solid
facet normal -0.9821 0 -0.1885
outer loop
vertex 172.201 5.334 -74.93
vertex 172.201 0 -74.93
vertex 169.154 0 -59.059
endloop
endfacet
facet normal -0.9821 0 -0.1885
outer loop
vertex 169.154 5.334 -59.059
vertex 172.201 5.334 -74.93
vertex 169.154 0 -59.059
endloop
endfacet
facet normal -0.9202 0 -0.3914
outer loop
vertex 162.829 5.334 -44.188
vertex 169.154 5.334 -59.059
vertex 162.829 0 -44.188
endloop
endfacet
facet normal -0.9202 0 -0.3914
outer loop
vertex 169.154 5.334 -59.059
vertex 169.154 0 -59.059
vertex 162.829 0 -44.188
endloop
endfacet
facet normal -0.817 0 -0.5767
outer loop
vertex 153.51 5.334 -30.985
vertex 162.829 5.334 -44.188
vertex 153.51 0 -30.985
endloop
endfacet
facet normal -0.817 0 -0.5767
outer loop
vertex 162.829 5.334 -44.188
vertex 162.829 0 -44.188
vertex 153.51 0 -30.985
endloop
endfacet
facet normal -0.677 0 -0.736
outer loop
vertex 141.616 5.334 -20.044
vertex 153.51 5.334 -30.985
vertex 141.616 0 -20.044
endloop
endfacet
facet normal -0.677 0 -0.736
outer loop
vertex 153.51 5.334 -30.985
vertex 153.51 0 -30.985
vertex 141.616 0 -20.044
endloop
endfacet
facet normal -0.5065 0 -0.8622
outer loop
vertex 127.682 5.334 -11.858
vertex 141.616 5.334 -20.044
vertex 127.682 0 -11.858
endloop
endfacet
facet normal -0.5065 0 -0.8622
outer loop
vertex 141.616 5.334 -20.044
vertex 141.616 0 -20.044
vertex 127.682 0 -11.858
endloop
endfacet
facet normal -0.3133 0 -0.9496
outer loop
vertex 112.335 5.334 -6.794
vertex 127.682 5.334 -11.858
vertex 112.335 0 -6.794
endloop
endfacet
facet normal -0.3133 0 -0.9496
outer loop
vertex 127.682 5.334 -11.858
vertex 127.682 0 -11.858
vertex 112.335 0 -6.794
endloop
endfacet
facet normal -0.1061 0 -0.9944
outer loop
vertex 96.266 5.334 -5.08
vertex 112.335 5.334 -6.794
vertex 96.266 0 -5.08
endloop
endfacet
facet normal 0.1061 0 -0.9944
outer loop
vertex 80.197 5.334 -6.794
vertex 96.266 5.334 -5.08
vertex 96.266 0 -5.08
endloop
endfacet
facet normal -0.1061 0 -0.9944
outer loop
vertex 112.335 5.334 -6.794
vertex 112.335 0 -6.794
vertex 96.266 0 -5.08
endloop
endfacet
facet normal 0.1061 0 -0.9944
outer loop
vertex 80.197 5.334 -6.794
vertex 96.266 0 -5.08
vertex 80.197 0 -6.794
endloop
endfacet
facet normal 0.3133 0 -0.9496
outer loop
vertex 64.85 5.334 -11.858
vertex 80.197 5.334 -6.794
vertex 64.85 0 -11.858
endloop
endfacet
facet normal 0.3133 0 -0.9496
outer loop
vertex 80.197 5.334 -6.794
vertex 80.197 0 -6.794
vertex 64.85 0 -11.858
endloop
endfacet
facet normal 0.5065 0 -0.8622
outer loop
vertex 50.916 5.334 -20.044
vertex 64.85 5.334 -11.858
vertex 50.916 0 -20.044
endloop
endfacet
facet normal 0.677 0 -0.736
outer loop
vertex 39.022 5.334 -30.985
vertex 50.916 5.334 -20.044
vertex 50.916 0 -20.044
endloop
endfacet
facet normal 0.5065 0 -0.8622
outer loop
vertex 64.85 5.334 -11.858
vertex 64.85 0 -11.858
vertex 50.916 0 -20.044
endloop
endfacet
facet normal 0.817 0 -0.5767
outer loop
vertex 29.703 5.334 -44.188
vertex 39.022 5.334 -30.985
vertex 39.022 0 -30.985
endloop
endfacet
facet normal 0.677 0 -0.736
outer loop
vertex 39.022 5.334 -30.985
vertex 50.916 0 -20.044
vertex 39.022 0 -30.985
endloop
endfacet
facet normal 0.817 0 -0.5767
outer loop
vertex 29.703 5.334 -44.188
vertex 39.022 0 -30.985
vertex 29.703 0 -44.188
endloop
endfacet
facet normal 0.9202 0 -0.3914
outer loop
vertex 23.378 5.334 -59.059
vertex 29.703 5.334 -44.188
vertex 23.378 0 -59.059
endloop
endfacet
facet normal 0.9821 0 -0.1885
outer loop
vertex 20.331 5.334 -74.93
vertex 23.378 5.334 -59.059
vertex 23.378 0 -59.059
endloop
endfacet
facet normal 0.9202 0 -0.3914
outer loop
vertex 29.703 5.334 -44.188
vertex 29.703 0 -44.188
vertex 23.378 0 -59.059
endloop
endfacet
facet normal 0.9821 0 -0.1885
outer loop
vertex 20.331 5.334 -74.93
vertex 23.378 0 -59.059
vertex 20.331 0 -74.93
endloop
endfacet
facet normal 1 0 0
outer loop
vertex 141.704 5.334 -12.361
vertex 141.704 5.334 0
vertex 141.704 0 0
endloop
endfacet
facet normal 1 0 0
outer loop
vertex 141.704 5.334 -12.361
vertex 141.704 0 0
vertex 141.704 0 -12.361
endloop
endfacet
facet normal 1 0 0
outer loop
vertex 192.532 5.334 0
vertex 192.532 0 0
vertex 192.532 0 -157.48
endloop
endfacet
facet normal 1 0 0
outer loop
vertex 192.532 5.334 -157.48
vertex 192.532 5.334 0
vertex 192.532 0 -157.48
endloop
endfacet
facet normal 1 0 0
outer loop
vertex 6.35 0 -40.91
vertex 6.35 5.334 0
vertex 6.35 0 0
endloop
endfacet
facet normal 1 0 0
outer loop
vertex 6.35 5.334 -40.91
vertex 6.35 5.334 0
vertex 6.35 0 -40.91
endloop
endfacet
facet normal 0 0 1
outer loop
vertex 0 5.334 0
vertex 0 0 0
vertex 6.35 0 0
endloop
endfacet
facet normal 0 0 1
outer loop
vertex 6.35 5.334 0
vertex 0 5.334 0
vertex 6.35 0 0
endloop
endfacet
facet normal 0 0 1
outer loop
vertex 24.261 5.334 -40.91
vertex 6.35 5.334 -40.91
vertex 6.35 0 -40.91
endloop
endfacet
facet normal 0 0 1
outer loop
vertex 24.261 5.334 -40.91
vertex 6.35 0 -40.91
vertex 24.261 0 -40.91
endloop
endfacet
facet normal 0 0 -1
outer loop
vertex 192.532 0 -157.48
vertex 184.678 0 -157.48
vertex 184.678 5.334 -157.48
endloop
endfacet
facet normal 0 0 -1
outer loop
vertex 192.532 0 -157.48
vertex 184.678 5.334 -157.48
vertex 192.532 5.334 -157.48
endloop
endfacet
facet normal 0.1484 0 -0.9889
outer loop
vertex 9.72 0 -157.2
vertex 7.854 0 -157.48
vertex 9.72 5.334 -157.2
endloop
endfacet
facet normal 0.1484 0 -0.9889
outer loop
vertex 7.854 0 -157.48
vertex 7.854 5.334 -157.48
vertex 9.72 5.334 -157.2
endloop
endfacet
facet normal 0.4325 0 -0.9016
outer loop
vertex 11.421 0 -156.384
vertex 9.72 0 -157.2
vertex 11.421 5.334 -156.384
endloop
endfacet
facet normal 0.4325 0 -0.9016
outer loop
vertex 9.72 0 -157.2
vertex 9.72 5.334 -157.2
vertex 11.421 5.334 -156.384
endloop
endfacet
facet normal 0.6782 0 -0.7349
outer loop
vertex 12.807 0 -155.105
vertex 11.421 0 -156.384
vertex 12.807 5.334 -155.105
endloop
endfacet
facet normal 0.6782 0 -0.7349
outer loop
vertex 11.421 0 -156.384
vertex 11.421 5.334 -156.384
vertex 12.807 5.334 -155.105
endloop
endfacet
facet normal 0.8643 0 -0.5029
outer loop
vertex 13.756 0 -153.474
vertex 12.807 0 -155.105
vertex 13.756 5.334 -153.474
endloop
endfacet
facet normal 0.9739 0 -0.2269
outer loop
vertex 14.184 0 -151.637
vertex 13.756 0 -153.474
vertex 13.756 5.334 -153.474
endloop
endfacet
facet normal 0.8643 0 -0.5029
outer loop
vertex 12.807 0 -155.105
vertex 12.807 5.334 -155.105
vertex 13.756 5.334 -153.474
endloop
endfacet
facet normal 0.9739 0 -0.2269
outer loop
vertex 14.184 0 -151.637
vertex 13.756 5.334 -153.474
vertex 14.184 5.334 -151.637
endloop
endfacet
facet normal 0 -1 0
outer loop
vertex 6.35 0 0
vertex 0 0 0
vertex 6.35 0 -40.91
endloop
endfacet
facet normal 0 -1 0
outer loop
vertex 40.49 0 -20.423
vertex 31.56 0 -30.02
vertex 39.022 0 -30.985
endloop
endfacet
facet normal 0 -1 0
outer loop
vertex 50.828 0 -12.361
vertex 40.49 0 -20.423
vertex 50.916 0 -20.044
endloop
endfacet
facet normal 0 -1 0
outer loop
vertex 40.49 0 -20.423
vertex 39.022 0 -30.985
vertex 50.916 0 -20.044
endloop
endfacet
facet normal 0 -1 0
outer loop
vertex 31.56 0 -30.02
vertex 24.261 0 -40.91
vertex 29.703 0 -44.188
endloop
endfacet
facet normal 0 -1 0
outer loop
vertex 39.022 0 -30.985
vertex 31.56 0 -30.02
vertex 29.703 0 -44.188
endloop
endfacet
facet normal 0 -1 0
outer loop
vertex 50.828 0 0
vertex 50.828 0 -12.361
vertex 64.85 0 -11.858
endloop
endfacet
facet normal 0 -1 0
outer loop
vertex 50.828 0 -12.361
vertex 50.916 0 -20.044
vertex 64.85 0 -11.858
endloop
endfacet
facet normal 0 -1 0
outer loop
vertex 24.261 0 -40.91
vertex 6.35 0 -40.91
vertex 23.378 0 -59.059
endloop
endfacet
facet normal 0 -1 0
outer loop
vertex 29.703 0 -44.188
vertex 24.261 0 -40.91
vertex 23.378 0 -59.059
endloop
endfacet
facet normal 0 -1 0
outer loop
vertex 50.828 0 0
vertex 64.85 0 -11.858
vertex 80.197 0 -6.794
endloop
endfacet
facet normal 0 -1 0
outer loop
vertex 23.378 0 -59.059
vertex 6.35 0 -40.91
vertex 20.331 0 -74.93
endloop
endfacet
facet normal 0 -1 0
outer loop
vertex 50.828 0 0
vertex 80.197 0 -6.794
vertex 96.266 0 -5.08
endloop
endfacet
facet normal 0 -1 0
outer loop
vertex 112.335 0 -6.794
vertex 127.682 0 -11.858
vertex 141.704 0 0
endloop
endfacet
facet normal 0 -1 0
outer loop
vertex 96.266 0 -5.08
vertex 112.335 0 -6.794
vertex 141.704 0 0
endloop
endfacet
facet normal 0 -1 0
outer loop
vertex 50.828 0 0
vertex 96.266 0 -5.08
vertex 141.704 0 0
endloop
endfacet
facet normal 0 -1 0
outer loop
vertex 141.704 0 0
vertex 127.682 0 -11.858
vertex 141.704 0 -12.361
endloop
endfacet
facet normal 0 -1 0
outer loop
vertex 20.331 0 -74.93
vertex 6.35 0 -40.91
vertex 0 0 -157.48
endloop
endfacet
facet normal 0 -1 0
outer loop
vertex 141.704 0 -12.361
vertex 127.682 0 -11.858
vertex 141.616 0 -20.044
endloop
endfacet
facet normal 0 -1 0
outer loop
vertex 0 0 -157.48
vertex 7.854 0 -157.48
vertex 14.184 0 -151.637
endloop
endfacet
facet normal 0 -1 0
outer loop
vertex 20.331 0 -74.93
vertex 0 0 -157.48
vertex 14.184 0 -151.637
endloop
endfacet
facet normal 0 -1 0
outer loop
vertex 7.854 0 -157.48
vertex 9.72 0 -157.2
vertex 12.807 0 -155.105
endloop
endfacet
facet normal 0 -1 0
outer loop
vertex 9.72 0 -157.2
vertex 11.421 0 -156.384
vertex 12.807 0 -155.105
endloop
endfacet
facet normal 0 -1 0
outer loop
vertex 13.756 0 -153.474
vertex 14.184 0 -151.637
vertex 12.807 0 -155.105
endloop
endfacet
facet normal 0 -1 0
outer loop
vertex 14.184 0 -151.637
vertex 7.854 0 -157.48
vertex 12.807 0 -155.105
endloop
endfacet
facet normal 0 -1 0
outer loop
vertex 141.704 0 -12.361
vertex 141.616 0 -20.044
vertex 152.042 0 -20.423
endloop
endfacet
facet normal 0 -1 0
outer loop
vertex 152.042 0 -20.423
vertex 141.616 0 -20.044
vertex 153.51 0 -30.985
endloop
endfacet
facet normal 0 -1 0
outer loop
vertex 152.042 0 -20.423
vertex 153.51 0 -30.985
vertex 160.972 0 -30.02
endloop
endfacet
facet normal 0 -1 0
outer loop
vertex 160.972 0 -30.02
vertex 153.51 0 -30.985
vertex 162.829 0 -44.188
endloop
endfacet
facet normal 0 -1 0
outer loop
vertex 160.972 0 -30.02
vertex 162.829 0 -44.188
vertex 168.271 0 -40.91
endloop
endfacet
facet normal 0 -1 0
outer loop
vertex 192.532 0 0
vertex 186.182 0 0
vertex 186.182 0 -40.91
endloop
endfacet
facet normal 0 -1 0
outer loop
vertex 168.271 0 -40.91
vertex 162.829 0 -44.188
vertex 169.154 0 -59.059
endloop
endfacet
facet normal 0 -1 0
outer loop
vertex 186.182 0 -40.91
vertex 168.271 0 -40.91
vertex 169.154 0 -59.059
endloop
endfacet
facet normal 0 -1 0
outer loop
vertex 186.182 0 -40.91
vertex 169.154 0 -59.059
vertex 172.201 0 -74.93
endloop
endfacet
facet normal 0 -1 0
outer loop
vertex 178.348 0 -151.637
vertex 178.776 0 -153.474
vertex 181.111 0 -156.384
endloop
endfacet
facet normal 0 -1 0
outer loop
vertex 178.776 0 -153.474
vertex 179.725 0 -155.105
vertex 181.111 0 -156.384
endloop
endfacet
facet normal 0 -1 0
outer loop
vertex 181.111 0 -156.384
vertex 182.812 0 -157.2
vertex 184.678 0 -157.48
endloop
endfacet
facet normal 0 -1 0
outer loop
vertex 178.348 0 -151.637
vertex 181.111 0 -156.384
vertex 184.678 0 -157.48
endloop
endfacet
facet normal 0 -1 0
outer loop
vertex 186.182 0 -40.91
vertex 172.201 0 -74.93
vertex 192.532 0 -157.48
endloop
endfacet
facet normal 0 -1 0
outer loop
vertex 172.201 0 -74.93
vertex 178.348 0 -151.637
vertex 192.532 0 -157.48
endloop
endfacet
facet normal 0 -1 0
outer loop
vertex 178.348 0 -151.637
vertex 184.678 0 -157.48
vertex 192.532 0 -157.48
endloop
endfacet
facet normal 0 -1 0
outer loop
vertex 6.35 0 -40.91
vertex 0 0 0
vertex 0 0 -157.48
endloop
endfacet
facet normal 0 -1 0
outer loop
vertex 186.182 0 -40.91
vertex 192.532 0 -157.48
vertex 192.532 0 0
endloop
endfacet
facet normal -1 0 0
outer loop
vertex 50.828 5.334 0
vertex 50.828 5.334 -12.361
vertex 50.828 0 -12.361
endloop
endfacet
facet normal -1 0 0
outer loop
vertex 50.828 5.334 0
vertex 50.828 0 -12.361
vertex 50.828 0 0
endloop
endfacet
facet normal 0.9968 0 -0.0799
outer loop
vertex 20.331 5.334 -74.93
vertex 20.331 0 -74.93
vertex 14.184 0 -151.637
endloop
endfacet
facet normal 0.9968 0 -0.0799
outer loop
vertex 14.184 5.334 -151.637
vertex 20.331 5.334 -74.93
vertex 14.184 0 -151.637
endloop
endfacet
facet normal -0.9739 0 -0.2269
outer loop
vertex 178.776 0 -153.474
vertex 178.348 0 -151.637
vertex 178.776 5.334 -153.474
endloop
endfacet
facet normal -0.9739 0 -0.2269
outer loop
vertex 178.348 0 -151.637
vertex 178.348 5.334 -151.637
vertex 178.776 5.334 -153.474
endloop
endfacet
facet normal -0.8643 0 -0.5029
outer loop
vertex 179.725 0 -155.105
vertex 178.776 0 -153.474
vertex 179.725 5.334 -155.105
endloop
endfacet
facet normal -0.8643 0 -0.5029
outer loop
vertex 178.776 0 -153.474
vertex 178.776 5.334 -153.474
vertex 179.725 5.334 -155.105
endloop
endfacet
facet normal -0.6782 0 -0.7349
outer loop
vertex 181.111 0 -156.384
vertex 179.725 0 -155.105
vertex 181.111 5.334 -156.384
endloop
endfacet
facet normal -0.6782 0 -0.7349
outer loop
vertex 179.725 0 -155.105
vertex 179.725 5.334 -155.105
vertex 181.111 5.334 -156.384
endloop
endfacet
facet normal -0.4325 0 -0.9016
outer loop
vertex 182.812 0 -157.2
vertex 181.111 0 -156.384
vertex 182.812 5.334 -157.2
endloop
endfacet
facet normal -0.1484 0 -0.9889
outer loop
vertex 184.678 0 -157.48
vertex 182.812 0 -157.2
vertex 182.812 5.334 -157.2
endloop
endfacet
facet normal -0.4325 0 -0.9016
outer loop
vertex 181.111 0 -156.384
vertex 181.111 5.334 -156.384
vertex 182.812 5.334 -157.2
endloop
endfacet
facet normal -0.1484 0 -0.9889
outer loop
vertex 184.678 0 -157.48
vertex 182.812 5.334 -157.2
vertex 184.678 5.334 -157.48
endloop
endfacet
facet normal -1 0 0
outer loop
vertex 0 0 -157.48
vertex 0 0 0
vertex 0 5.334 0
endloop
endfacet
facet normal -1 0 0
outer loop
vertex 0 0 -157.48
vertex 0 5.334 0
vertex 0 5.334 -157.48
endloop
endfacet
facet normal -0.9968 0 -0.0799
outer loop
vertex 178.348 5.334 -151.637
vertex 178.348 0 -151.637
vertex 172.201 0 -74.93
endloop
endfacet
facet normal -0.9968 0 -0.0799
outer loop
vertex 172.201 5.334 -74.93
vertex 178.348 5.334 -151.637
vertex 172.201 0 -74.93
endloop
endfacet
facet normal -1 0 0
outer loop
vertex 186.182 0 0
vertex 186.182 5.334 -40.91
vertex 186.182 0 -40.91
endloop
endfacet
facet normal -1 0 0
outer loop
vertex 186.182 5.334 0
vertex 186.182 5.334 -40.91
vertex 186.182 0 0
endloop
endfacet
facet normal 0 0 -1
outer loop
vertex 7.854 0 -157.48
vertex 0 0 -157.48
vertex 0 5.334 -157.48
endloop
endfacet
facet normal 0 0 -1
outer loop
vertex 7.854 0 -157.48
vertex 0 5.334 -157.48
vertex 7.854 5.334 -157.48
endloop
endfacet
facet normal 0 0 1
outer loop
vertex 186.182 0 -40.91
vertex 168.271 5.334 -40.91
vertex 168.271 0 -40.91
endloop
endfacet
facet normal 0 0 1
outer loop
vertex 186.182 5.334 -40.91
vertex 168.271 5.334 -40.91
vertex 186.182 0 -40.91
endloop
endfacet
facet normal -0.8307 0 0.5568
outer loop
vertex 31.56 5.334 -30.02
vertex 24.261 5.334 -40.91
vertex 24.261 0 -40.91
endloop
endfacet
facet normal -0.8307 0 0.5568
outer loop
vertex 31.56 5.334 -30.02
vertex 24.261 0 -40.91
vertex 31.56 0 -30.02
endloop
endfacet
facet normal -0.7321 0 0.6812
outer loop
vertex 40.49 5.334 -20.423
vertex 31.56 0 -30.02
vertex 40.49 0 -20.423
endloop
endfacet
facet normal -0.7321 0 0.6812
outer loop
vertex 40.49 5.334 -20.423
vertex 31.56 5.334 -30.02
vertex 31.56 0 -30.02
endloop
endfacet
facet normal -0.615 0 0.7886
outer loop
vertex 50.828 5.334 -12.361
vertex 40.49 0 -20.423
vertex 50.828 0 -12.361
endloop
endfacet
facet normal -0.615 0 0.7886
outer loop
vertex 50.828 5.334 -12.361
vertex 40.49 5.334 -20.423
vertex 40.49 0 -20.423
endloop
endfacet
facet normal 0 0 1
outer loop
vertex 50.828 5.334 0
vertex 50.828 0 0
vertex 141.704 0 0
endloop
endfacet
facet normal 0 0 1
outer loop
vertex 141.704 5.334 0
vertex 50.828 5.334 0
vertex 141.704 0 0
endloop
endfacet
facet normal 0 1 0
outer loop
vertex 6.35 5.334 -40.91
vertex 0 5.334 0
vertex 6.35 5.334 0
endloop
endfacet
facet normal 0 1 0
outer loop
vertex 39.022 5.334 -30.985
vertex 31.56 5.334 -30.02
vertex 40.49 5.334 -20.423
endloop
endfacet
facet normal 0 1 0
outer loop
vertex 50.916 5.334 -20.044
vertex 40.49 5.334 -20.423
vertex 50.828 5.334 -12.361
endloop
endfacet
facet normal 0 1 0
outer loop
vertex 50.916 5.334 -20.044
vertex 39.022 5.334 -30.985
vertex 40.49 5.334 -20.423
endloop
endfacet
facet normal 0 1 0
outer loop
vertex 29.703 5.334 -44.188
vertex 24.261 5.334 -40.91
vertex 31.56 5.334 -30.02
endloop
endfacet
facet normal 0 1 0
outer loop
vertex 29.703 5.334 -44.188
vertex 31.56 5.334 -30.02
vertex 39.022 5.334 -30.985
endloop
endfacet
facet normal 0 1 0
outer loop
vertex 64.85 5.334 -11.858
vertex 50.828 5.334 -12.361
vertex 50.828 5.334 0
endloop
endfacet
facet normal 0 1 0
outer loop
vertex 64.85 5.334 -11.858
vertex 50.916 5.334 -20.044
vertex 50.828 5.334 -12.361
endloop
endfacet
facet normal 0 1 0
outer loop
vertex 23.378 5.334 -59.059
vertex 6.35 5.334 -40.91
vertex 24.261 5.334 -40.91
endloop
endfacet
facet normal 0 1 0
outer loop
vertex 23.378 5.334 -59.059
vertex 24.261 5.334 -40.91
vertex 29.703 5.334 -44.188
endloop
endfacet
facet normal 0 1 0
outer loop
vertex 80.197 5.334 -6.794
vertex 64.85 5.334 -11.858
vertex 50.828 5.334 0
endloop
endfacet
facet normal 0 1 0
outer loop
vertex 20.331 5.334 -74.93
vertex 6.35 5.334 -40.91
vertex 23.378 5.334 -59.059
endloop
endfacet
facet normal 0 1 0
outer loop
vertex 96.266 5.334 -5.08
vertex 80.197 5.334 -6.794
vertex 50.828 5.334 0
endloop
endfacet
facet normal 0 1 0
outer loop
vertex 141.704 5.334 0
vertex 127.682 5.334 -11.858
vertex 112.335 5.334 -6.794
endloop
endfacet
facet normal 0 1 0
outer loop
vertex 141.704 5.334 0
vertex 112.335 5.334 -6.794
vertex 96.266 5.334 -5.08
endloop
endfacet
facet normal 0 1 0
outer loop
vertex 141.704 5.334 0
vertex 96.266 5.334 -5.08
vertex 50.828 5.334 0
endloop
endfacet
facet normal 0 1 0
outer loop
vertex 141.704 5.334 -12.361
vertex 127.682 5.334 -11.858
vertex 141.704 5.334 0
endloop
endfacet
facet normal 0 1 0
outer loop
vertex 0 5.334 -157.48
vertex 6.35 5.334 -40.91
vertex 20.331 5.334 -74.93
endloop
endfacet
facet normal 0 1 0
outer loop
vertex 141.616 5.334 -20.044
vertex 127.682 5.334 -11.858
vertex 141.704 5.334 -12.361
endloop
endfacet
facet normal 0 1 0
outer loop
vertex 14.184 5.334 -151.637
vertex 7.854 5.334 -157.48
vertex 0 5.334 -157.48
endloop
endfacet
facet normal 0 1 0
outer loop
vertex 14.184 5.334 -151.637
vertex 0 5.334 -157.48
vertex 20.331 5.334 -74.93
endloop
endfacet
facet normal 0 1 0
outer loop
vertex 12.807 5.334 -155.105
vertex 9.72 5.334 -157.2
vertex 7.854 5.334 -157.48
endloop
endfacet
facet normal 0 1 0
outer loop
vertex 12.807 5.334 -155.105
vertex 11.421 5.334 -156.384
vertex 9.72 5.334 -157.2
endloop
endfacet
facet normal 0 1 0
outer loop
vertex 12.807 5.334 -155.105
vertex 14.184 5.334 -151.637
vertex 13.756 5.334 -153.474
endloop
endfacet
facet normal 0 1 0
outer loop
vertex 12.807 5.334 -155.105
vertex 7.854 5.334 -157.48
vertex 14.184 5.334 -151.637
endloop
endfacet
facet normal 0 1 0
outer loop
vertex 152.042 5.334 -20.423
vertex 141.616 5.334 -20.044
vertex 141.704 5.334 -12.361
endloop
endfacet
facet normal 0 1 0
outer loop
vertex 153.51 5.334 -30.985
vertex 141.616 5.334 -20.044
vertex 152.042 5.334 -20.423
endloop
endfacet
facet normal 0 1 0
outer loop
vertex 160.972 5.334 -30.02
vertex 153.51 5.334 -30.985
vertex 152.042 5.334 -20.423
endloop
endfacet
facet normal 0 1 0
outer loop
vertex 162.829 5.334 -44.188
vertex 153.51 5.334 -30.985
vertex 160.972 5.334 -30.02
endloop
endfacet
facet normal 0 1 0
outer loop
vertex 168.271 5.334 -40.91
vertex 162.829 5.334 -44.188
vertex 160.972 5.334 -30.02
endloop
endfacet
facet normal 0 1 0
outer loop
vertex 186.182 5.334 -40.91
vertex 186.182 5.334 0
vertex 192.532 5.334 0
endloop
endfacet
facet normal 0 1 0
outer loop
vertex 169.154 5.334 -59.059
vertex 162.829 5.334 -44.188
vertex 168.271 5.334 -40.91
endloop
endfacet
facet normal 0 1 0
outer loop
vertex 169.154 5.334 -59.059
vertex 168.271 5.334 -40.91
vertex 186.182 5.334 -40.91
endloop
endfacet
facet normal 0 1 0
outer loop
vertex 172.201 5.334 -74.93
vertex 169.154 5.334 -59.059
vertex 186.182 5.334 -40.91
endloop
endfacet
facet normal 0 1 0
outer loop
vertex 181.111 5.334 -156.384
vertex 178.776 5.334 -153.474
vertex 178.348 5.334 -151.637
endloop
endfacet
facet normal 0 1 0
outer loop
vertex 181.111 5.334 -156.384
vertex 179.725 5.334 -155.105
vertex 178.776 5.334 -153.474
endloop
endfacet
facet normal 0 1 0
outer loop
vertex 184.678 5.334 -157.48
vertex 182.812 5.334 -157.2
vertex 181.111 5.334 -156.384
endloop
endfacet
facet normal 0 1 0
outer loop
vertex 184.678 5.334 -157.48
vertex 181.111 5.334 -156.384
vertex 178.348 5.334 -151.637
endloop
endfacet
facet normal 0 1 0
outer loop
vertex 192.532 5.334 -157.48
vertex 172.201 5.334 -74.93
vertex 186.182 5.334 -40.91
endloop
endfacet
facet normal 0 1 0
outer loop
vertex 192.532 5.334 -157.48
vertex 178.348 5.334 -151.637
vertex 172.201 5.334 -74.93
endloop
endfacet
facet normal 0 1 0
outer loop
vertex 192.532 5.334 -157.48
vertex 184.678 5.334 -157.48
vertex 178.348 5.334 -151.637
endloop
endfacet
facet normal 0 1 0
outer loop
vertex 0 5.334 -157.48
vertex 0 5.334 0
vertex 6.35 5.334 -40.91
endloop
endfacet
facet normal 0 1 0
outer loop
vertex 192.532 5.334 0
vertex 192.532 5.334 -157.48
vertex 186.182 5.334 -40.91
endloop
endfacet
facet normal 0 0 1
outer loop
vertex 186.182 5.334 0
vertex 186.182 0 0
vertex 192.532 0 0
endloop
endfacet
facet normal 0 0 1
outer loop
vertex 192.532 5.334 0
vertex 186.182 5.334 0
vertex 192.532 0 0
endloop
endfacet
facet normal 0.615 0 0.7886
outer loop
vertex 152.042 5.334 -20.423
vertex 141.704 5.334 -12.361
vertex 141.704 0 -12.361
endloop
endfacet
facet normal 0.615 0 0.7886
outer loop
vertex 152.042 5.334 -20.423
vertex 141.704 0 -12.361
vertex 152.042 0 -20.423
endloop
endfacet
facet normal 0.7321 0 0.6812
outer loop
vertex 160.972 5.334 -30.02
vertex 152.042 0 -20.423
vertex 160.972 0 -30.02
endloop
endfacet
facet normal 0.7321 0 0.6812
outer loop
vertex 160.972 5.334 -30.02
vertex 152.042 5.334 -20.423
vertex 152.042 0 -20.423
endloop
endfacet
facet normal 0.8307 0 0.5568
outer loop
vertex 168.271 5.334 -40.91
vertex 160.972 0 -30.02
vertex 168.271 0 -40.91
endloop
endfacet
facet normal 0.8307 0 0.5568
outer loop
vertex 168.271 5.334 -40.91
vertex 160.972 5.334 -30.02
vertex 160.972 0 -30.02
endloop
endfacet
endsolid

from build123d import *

# Parameters (mm, degrees)
SKETCH1_W             = 192.532
SKETCH1_H             = 157.48
BASE_DEPTH            = 5.334
CENTER_CUT_DEPTH      = 249.791022708
CENTER_CUT_DEPTH_BACK = 249.791022708
FILLET1_R             = 6.35
CUT_EXTRUDE3_DEPTH    = 249.791022708


with BuildPart() as part:
    # Sketch1 → Base (new body)
    with BuildSketch(Plane(origin=(0, 0, 0), x_dir=(1, 0, 0), z_dir=(0, 1, 0))):
        with Locations((96.266, 78.74)):
            Rectangle(SKETCH1_W, SKETCH1_H)
    extrude(amount=BASE_DEPTH)

    # Sketch2 → Center Cut (cut, two sides: drawn at the far end of the back side and taken through both)
    with BuildSketch(Plane(origin=(0, 5.334, 0), x_dir=(1, 0, 0), z_dir=(0, 1, 0)).offset(-CENTER_CUT_DEPTH_BACK)):
        with BuildLine():
            Line((217.68055776, 642.475883119), (178.816, 157.48))
            Line((178.816, 157.48), (172.200955719, 74.93))
            ThreePointArc((172.200955719, 74.93), (96.266, 5.08), (20.331044281, 74.93))
            Line((20.331044281, 74.93), (13.716, 157.48))
            Line((13.716, 157.48), (-25.14855776, 642.475883119))
            Line((-25.14855776, 642.475883119), (-25.14855776, 1615.577029953))
            Line((-25.14855776, 1615.577029953), (217.68055776, 1615.577029953))
            Line((217.68055776, 1615.577029953), (217.68055776, 642.475883119))
        make_face()
    extrude(amount=CENTER_CUT_DEPTH + CENTER_CUT_DEPTH_BACK, mode=Mode.SUBTRACT)

    # Fillet1
    fillet1_edges = [part.edges().sort_by_distance(p)[0] for p in [
        (178.816, 2.667, -157.48),
        (13.716, 2.667, -157.48),
    ]]
    fillet(fillet1_edges, radius=FILLET1_R)

    # Sketch7 → Cut-Extrude3 (cut, through all)
    with BuildSketch(Plane(origin=(0, 5.334, 0), x_dir=(1, 0, 0), z_dir=(0, 1, 0))):
        with BuildLine():
            Line((6.35, 40.9102037), (24.260569325, 40.9102037))
            ThreePointArc((24.260569325, 40.9102037), (35.834123486, 25.043972393), (50.827976512, 12.360564994))
            Line((50.827976512, 12.360564994), (50.827976512, 0))
            Line((50.827976512, 0), (6.35, 0))
            Line((6.35, 0), (6.35, 40.9102037))
        make_face()
        with BuildLine():
            Line((186.182, 40.9102037), (186.182, 0))
            Line((186.182, 0), (141.704023488, 0))
            Line((141.704023488, 0), (141.704023488, 12.360564994))
            ThreePointArc((141.704023488, 12.360564994), (156.697876514, 25.043972393), (168.271430675, 40.9102037))
            Line((168.271430675, 40.9102037), (186.182, 40.9102037))
        make_face()
    extrude(amount=-CUT_EXTRUDE3_DEPTH, mode=Mode.SUBTRACT)


solid = part.part
